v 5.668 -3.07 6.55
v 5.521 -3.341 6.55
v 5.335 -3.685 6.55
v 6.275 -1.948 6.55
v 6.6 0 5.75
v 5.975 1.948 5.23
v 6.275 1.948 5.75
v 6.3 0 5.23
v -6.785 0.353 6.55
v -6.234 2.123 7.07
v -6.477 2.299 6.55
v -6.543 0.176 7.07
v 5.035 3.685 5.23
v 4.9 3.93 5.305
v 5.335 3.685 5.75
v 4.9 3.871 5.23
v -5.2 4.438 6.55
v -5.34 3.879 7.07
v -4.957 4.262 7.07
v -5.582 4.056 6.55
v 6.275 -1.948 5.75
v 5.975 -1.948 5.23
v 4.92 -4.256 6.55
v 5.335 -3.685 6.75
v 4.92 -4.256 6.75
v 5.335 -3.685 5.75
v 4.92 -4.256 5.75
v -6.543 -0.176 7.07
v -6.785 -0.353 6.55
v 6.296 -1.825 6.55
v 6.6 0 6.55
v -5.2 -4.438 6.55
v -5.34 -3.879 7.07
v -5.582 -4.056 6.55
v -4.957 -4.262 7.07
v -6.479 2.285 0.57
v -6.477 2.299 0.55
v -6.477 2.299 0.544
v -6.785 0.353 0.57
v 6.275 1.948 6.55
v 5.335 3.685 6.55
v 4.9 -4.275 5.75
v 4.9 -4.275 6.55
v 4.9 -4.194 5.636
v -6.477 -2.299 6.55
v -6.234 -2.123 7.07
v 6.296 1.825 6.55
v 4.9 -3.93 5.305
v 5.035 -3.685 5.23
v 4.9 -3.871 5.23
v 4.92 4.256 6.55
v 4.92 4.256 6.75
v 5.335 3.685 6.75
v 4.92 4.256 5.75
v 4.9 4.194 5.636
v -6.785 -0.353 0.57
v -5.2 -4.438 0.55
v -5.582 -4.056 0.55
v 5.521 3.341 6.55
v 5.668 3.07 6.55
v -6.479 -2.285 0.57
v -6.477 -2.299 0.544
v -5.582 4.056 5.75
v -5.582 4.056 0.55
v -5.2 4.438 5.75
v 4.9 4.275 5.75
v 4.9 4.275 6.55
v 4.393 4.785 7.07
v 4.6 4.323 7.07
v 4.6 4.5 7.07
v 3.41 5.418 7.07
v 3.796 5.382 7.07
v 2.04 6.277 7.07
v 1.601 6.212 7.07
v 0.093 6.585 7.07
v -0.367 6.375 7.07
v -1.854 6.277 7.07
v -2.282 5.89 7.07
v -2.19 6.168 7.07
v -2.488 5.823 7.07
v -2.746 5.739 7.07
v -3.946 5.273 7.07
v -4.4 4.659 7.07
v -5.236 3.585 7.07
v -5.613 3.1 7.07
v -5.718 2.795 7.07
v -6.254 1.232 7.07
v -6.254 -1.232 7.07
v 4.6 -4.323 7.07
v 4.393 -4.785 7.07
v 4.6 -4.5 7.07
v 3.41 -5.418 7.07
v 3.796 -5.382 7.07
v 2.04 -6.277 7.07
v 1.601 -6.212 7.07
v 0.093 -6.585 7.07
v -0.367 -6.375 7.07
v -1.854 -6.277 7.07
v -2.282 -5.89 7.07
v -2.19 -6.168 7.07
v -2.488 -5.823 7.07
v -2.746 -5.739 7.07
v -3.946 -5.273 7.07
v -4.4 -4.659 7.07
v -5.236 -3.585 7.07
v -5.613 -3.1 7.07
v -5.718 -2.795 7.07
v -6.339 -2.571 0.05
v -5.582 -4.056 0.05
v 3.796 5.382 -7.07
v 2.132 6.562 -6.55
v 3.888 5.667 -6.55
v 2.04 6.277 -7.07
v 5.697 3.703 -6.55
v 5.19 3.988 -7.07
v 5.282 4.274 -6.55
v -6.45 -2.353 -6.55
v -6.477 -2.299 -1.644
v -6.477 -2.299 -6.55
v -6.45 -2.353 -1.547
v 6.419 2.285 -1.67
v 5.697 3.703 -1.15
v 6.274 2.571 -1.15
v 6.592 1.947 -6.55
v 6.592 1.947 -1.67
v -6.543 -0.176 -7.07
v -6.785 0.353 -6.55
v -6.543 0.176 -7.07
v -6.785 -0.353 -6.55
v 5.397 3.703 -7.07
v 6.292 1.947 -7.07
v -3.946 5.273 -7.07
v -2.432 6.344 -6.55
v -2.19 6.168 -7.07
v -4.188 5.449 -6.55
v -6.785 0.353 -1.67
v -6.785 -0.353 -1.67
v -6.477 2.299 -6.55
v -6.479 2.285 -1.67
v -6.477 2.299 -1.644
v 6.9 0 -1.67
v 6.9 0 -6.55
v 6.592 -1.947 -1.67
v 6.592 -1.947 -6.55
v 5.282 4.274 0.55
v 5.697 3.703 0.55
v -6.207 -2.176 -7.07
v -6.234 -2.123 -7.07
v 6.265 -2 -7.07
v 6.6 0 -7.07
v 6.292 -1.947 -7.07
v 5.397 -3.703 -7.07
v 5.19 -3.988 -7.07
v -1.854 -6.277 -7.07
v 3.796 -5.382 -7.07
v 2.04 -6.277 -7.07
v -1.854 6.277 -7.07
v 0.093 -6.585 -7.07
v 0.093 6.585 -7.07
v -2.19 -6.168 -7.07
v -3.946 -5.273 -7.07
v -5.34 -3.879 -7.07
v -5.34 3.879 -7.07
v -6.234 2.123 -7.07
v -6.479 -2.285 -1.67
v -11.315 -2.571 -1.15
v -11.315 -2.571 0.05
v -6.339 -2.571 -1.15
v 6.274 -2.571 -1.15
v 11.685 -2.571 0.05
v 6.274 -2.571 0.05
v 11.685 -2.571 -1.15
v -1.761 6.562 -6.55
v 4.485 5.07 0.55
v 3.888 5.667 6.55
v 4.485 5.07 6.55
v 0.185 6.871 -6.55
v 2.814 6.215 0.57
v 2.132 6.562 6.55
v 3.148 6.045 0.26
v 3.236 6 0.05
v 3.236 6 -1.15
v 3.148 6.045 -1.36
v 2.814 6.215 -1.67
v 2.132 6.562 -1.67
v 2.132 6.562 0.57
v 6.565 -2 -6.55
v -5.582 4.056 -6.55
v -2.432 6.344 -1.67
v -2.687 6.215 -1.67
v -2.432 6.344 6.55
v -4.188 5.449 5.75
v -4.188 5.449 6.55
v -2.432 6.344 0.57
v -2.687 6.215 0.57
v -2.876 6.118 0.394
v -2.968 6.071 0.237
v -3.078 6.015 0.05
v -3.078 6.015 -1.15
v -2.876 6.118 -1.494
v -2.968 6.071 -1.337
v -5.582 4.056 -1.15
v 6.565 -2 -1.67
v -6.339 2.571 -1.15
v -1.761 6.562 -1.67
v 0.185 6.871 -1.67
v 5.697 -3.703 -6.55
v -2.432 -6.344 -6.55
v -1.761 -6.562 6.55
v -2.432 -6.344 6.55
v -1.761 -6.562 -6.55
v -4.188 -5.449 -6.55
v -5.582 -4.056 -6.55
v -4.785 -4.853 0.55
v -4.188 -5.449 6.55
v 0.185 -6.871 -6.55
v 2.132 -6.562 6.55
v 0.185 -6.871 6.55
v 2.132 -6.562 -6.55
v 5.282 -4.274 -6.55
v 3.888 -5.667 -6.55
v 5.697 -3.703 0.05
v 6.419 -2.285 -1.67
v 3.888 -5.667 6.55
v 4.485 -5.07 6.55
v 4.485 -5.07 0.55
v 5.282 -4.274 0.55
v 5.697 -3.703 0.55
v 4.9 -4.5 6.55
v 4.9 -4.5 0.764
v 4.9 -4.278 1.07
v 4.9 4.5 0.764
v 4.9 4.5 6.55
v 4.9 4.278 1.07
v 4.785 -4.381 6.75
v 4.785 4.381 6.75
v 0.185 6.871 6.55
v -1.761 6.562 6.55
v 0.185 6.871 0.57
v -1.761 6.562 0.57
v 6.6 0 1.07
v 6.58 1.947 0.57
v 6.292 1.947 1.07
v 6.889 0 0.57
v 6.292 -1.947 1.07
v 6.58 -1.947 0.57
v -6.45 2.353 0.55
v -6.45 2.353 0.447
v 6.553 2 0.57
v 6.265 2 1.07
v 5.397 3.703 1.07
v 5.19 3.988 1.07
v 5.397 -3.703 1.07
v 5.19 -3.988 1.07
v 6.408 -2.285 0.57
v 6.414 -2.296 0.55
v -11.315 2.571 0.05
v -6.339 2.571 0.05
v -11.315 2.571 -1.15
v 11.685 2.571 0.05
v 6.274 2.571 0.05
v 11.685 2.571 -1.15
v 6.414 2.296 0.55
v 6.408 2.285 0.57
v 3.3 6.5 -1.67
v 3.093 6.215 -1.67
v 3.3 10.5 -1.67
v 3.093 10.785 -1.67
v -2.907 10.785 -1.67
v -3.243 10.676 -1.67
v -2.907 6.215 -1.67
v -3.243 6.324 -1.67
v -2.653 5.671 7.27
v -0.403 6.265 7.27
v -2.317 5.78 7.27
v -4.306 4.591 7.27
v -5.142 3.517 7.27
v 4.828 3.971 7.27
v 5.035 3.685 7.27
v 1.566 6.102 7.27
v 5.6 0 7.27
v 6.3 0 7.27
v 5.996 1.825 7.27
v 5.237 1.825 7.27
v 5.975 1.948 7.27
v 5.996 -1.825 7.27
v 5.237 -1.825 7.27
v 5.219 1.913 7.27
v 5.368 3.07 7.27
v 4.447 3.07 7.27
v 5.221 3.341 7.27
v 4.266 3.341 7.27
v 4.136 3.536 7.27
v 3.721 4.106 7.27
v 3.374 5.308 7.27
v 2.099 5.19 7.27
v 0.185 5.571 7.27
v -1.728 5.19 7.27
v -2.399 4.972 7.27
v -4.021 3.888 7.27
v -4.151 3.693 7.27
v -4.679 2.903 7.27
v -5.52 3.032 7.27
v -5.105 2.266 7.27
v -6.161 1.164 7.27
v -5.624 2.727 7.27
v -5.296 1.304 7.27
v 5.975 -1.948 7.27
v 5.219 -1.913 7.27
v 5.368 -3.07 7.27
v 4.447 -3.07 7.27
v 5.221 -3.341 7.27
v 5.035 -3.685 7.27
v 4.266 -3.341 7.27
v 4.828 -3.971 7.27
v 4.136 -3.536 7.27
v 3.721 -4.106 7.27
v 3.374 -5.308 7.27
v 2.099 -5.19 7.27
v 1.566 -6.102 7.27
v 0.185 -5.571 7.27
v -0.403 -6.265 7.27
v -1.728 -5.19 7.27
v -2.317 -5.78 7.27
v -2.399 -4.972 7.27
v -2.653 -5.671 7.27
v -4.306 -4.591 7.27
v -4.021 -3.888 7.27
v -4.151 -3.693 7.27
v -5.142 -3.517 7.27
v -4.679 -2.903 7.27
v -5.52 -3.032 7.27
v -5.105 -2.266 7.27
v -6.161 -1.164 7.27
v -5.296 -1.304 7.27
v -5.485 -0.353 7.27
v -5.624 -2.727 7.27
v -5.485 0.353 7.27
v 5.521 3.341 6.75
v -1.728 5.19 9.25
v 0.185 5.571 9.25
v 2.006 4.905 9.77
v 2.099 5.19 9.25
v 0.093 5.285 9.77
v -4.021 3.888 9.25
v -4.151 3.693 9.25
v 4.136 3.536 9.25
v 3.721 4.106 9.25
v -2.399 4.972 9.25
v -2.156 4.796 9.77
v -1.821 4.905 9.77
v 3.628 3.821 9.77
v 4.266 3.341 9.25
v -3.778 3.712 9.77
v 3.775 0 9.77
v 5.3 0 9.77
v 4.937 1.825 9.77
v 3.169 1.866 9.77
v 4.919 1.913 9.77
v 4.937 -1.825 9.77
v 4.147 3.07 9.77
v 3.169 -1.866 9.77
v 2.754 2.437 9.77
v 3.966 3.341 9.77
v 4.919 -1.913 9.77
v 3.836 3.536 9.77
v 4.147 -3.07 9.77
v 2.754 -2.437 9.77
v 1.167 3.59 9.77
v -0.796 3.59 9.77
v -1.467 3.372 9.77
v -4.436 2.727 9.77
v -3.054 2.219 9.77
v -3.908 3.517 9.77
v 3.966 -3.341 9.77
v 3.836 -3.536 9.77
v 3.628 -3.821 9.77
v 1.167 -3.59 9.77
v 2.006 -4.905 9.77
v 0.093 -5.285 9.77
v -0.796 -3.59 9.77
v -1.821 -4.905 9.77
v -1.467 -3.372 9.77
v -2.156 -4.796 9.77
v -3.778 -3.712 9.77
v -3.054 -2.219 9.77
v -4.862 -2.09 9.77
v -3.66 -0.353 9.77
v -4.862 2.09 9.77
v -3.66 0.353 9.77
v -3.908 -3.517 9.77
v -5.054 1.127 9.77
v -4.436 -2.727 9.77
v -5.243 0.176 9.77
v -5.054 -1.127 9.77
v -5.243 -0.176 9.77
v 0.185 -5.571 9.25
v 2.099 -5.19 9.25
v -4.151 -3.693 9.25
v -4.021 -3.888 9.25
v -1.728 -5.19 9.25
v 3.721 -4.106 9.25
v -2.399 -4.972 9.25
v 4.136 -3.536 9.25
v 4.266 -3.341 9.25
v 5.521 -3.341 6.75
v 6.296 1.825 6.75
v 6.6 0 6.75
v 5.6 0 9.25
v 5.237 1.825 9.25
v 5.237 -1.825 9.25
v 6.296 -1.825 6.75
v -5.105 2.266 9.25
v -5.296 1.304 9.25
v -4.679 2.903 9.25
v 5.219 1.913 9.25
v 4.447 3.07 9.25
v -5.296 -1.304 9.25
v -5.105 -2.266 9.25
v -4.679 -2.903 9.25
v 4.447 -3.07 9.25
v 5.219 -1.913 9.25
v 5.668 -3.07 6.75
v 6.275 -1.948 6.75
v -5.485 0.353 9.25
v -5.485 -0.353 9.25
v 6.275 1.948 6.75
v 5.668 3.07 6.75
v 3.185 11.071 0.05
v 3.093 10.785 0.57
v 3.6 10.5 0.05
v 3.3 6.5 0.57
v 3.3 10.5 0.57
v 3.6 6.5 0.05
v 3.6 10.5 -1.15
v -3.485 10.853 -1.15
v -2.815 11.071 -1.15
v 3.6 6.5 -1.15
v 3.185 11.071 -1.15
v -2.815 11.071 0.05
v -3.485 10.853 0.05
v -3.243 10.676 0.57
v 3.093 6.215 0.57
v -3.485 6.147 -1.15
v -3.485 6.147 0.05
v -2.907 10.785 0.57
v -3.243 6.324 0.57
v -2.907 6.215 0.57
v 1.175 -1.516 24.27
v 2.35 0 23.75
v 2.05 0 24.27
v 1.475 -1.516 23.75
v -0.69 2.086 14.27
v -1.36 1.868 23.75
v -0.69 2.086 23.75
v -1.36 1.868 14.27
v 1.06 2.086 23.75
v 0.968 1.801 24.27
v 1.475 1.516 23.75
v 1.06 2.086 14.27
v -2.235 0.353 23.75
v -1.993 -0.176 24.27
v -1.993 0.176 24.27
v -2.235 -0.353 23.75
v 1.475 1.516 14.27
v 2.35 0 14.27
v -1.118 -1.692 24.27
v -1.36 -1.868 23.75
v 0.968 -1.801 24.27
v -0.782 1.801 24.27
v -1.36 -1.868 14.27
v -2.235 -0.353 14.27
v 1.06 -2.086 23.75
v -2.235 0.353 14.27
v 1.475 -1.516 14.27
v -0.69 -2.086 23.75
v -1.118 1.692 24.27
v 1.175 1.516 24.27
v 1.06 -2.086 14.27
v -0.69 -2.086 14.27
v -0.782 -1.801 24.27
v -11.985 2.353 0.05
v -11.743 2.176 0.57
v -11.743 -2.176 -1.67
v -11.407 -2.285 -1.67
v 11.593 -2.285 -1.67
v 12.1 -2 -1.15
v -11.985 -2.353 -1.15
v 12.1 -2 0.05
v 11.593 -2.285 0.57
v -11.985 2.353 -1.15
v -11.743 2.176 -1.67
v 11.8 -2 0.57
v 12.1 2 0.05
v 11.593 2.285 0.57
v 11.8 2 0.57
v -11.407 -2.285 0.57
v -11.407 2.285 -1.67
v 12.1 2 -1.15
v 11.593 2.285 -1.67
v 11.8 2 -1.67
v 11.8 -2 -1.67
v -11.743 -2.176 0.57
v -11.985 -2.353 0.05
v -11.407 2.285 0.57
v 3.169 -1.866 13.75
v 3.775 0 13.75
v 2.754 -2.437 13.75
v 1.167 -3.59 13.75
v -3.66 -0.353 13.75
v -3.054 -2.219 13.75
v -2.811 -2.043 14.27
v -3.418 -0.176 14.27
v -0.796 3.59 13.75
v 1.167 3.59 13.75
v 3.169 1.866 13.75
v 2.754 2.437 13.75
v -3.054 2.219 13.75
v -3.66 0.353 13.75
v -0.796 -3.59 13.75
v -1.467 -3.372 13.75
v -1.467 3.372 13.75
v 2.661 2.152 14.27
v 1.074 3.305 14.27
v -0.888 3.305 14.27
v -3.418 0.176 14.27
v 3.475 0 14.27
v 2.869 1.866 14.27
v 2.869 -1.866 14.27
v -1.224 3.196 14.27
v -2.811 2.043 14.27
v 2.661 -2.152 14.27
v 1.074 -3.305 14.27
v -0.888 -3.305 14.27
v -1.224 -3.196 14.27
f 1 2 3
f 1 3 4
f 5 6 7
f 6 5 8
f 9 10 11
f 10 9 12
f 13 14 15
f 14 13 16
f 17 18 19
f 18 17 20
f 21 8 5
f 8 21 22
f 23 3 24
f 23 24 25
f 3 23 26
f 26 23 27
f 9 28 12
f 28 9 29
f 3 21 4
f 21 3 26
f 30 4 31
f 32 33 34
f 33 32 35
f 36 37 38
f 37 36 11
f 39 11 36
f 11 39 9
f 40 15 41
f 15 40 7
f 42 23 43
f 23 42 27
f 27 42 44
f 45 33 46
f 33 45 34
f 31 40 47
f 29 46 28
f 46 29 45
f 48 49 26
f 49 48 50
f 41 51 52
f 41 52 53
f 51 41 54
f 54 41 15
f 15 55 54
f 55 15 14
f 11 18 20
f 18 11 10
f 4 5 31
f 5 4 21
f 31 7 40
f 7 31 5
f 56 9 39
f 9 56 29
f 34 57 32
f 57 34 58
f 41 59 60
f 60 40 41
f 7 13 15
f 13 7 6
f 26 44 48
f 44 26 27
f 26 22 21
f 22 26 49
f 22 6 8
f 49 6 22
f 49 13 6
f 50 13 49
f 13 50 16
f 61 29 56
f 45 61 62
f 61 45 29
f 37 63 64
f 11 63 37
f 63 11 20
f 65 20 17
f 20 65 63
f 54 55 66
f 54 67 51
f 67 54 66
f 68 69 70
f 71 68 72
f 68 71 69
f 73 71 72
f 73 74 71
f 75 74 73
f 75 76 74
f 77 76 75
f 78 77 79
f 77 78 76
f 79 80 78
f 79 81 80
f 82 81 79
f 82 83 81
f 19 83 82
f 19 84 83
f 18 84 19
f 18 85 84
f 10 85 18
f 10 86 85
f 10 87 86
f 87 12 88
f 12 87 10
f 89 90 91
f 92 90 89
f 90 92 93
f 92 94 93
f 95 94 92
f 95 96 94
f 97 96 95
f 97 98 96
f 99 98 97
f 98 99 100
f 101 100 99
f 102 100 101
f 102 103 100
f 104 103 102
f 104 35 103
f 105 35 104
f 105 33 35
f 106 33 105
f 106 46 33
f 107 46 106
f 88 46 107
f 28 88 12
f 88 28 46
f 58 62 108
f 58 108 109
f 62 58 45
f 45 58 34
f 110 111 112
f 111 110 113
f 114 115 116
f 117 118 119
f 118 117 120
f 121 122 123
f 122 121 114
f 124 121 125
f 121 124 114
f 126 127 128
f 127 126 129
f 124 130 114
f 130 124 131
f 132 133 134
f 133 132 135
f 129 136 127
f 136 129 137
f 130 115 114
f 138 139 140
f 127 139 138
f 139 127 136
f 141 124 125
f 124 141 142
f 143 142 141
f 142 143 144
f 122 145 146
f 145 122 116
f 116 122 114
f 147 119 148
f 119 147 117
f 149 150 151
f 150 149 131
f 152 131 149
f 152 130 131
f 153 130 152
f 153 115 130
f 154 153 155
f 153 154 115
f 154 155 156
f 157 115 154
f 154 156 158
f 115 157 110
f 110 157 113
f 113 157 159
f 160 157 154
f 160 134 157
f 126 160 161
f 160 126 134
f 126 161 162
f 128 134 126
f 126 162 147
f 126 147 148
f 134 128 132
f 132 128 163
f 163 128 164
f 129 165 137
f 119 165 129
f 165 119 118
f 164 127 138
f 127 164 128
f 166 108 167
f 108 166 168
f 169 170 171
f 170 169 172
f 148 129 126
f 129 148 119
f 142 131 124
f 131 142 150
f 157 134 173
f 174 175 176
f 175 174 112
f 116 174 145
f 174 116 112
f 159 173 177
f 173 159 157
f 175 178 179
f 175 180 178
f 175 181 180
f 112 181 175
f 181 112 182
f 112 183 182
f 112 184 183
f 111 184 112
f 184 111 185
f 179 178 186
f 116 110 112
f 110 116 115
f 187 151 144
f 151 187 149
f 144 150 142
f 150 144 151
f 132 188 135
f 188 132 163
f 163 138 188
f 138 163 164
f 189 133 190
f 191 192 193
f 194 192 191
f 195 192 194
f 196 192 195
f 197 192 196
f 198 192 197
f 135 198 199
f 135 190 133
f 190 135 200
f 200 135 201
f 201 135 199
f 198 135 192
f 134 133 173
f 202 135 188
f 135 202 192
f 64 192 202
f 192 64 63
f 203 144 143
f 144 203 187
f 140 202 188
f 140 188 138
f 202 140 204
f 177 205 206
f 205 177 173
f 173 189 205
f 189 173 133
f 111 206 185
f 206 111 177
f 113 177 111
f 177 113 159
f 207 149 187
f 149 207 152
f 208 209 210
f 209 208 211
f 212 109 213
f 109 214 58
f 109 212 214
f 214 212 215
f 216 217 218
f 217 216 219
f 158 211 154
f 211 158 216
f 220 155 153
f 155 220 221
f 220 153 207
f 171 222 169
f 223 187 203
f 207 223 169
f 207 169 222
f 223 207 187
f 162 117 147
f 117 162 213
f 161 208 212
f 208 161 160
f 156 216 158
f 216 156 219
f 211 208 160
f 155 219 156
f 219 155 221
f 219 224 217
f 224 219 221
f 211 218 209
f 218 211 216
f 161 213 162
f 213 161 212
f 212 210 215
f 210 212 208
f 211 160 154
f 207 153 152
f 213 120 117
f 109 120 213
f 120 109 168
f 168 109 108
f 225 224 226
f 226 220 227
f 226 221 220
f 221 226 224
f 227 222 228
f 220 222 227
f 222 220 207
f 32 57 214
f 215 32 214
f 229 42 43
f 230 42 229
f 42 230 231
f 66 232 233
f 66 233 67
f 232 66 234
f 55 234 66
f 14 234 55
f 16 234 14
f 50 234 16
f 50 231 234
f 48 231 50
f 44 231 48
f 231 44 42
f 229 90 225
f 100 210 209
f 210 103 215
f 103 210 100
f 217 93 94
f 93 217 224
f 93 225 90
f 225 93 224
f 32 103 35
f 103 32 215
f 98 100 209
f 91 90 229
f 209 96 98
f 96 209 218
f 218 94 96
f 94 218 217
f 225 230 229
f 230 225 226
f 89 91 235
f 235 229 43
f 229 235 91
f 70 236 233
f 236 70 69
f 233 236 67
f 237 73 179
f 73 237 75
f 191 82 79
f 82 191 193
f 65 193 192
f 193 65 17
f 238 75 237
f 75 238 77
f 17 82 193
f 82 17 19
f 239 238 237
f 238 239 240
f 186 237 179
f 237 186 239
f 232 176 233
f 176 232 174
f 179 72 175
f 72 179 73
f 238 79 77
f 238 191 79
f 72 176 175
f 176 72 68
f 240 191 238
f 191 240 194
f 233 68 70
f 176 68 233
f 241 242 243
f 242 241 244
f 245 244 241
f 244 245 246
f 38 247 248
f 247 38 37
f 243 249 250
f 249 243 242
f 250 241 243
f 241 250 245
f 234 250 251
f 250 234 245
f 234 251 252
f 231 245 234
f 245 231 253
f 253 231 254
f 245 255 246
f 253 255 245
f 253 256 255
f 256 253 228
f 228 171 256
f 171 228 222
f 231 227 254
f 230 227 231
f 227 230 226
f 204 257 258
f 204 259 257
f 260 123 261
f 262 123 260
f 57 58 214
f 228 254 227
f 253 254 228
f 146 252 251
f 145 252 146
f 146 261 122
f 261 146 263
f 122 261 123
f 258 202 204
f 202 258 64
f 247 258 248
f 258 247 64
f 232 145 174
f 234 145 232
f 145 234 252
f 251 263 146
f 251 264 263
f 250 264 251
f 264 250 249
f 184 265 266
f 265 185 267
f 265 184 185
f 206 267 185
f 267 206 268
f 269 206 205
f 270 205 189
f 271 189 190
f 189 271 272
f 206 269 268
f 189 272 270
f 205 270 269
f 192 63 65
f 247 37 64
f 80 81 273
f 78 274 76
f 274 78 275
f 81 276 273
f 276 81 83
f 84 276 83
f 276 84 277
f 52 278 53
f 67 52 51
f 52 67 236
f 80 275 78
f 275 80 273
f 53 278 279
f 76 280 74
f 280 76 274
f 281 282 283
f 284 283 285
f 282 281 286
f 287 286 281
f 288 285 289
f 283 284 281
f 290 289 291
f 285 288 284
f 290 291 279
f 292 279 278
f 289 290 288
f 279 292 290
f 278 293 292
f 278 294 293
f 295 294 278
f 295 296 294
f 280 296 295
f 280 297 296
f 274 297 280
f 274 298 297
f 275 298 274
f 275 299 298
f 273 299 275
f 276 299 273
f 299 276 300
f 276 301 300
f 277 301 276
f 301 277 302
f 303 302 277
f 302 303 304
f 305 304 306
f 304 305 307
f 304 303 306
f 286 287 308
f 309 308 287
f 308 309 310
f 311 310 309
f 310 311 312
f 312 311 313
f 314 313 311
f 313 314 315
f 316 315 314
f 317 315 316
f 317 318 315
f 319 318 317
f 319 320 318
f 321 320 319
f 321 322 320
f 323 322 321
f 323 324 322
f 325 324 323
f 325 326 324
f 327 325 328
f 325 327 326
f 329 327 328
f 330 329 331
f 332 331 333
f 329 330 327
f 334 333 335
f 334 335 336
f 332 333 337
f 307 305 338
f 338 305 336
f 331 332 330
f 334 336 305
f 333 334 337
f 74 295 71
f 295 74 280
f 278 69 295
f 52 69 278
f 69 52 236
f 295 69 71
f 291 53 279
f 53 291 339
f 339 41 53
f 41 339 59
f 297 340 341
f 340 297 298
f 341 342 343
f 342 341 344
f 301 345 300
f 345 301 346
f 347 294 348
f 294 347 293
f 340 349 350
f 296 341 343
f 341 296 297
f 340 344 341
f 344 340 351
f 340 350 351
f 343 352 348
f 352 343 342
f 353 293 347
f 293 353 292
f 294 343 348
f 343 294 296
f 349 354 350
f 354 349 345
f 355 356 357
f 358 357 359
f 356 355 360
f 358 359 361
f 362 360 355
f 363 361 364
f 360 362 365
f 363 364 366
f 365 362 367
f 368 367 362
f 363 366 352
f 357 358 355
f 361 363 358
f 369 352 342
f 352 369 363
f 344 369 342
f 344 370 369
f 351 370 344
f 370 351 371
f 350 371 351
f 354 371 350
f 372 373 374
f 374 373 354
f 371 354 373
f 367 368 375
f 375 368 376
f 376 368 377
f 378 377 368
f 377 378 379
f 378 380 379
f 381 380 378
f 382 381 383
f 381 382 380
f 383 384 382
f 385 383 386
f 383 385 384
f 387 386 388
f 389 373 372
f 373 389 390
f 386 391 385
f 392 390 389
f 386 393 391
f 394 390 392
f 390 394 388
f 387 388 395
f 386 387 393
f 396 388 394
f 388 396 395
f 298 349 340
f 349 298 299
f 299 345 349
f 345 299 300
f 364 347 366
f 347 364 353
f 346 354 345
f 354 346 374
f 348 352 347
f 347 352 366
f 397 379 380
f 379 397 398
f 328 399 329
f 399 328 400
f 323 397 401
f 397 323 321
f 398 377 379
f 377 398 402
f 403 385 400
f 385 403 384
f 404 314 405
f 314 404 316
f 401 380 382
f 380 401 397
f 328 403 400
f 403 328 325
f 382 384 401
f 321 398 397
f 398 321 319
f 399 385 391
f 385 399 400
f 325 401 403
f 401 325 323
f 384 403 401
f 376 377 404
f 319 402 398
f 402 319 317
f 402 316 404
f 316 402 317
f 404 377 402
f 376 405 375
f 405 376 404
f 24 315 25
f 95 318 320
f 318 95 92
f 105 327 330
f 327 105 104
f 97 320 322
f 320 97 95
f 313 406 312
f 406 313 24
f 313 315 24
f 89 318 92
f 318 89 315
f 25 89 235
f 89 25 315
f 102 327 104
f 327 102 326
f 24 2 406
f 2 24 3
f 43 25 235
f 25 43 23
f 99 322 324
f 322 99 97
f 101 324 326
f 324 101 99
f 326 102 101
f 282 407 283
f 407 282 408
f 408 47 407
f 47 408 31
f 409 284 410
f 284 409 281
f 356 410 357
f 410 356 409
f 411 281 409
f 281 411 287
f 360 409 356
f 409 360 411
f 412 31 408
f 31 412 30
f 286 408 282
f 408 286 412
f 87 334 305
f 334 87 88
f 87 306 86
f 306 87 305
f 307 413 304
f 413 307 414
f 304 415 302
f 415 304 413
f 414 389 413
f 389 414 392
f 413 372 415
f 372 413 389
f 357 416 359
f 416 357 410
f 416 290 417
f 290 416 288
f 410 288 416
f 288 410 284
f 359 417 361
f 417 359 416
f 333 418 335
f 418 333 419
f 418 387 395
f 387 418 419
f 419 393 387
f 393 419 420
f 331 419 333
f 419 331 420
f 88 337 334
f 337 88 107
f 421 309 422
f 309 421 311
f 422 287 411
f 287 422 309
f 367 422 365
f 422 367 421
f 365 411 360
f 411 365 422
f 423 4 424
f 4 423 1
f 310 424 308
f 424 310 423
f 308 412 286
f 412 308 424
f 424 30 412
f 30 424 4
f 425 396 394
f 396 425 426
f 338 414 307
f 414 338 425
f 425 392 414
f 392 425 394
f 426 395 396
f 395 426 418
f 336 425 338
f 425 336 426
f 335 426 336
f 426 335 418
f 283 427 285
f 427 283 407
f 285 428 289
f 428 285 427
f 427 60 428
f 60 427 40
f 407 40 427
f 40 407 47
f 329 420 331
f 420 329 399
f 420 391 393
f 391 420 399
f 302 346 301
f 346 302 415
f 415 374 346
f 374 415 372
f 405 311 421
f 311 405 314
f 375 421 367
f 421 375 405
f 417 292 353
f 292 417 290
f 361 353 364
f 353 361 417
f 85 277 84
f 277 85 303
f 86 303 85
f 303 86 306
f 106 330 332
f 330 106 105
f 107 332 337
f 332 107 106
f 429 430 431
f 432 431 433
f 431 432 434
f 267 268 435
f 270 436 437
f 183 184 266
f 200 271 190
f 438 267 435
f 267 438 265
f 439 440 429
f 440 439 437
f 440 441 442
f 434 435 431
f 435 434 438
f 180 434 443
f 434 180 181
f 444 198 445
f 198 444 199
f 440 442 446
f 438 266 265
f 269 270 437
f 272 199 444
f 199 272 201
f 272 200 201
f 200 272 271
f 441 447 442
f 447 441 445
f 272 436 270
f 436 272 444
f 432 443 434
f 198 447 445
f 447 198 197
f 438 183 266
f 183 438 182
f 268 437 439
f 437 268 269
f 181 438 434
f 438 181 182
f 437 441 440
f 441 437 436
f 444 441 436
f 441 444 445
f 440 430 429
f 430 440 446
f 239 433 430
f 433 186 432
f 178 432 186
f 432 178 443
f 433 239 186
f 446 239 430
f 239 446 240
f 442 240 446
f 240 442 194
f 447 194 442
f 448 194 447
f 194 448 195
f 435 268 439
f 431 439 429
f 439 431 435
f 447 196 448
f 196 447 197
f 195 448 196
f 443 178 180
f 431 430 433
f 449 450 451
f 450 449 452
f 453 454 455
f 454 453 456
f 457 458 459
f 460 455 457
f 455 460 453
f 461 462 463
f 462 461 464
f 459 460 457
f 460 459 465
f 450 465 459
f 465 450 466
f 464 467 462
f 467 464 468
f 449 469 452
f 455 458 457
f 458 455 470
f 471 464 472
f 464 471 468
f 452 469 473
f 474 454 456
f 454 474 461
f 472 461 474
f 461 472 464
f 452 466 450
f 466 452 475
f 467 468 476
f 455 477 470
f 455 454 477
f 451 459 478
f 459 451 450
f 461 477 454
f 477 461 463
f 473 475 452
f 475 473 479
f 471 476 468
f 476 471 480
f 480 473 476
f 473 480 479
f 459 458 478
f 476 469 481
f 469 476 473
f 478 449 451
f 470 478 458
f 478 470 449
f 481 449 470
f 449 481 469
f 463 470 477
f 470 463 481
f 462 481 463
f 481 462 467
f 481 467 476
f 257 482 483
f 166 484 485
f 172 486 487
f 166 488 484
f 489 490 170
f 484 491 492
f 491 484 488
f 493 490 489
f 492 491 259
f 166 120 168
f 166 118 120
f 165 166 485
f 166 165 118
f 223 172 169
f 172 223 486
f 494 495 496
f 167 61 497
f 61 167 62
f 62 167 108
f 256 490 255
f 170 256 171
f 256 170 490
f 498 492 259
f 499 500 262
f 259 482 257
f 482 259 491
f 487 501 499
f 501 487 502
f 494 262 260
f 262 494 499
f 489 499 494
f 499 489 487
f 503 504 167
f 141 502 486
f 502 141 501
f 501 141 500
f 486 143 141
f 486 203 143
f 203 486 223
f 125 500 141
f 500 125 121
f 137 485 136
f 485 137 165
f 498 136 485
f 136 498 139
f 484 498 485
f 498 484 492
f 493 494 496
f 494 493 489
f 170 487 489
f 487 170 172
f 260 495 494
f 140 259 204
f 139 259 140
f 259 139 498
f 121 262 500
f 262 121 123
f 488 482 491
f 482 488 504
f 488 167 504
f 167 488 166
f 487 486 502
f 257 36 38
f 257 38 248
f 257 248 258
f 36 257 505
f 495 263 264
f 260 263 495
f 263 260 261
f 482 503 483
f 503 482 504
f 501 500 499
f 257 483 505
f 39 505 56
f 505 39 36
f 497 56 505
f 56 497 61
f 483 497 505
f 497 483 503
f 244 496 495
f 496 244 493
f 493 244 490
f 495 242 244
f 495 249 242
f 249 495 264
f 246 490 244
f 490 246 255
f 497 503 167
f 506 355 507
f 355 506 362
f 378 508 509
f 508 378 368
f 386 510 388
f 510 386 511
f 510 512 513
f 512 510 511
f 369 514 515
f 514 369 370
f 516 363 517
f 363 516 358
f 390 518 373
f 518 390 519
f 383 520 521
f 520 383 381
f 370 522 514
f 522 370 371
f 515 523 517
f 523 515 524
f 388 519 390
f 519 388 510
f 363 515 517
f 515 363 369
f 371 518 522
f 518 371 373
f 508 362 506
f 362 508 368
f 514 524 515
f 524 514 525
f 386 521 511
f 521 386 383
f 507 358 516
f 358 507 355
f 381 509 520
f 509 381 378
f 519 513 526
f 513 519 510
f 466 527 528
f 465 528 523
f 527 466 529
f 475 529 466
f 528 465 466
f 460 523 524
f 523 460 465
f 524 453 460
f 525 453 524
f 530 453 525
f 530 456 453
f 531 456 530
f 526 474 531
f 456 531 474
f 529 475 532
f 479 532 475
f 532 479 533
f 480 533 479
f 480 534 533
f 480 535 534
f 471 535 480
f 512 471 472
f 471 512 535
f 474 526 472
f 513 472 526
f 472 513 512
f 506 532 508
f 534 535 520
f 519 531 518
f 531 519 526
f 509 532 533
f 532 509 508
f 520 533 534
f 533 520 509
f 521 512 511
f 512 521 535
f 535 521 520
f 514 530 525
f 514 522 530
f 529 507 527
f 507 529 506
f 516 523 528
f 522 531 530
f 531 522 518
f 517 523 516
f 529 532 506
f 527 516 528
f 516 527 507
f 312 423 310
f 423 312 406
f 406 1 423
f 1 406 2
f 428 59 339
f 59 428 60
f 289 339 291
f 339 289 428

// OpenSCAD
// Parameters
body_diameter = 12.6; //[6.3:25.2:0.1]
body_height = 13.1; //[6.55:26.2:0.1]
eps = 0.8; //[0.5:2:0.1]
top_face_thickness = 0.8; //[0.4:2:0.1]
bottom_face_thickness = 0.8; //[0.4:2:0.1]
lever_diameter = 3.5; //[2:7:0.1]
lever_height = 18; //[8:36:0.5]
thread_diameter = 6.35; //[3:12.7:0.05]
thread_height = 8; //[4:16:0.5]
nut_flat_width = 10; //[6:20:0.5]
nut_thickness = 2.5; //[1.5:5:0.1]
washer_diameter = 12; //[8:24:0.5]
washer_thickness = 1; //[0.5:2.5:0.1]
lug_width = 4; //[2:8:0.1]
lug_thickness = 1.2; //[0.6:3:0.1]
lug_length = 6; //[3:12:0.5]
lug_drop = 6; //[3:12:0.5]
anti_flat_depth = 1; //[0.5:2.5:0.1]
anti_flat_height = 6; //[3:12:0.5]
fillet_radius = 0.6; //[0.2:2:0.1]

// Base Shapes
module switch_body_cylinder() {
  translate([0, 0, 0])
    cylinder(r=body_diameter/2, h=body_height, center=true);
}

module top_face() {
  translate([0, 0, body_height/2 - top_face_thickness/2])
    cylinder(r=body_diameter/2, h=top_face_thickness, center=true);
}

module bottom_face() {
  translate([0, 0, -body_height/2 + bottom_face_thickness/2])
    cylinder(r=body_diameter/2, h=bottom_face_thickness, center=true);
}

module toggle_lever() {
  translate([0, 0, body_height/2 + lever_height/2 - eps])
    cylinder(r=lever_diameter/2, h=lever_height, center=true);
}

module mounting_thread() {
  translate([0, 0, body_height/2 + thread_height/2 - eps])
    cylinder(r=thread_diameter/2, h=thread_height, center=true);
}

module mounting_nut_outer() {
  translate([0, 0, body_height/2 + washer_thickness + nut_thickness/2 - eps])
    cylinder(r=nut_flat_width/2, h=nut_thickness, center=true);
}

module mounting_nut_hole() {
  translate([0, 0, body_height/2 + washer_thickness + nut_thickness/2 - eps])
    cylinder(r=thread_diameter/2 + eps/4, h=nut_thickness + eps, center=true);
}

module washer_outer() {
  translate([0, 0, body_height/2 + washer_thickness/2 - eps])
    cylinder(r=washer_diameter/2, h=washer_thickness, center=true);
}

module washer_hole() {
  translate([0, 0, body_height/2 + washer_thickness/2 - eps])
    cylinder(r=thread_diameter/2 + eps/4, h=washer_thickness + eps, center=true);
}

module terminal_lug_1() {
  translate([body_diameter/2 + lug_length/2 - eps, 0, -body_height/2 + lug_drop])
    cube([lug_length, lug_width, lug_thickness], center=true);
}

module terminal_lug_2() {
  translate([-(body_diameter/2 + lug_length/2 - eps), 0, -body_height/2 + lug_drop])
    cube([lug_length, lug_width, lug_thickness], center=true);
}

module terminal_lug_3() {
  translate([0, body_diameter/2 + lug_length/2 - eps, -body_height/2 + lug_drop])
    cube([lug_length, lug_width, lug_thickness], center=true);
}

module anti_rotation_flat_cut() {
  translate([body_diameter/2 - anti_flat_depth, 0, body_height/2 - anti_flat_height/2])
    cube([anti_flat_depth*2, body_diameter*2, anti_flat_height], center=true);
}

module fillet_sphere() {
  translate([0, 0, 0])
    sphere(r=fillet_radius, center=true);
}

// Operations
module mounting_nut() {
  difference() {
    mounting_nut_outer();
    mounting_nut_hole();
  }
}

module washer() {
  difference() {
    washer_outer();
    washer_hole();
  }
}

module body_with_faces() {
  union() {
    switch_body_cylinder();
    top_face();
    bottom_face();
  }
}

module body_with_flat() {
  difference() {
    body_with_faces();
    anti_rotation_flat_cut();
  }
}

module body_with_secondary_features() {
  union() {
    body_with_flat();
    mounting_thread();
    toggle_lever();
    mounting_nut();
    washer();
    terminal_lug_1();
    terminal_lug_2();
    terminal_lug_3();
  }
}

module fillets_chamfers() {
  minkowski() {
    body_with_secondary_features();
    fillet_sphere();
  }
}

// Final Output
fillets_chamfers();
